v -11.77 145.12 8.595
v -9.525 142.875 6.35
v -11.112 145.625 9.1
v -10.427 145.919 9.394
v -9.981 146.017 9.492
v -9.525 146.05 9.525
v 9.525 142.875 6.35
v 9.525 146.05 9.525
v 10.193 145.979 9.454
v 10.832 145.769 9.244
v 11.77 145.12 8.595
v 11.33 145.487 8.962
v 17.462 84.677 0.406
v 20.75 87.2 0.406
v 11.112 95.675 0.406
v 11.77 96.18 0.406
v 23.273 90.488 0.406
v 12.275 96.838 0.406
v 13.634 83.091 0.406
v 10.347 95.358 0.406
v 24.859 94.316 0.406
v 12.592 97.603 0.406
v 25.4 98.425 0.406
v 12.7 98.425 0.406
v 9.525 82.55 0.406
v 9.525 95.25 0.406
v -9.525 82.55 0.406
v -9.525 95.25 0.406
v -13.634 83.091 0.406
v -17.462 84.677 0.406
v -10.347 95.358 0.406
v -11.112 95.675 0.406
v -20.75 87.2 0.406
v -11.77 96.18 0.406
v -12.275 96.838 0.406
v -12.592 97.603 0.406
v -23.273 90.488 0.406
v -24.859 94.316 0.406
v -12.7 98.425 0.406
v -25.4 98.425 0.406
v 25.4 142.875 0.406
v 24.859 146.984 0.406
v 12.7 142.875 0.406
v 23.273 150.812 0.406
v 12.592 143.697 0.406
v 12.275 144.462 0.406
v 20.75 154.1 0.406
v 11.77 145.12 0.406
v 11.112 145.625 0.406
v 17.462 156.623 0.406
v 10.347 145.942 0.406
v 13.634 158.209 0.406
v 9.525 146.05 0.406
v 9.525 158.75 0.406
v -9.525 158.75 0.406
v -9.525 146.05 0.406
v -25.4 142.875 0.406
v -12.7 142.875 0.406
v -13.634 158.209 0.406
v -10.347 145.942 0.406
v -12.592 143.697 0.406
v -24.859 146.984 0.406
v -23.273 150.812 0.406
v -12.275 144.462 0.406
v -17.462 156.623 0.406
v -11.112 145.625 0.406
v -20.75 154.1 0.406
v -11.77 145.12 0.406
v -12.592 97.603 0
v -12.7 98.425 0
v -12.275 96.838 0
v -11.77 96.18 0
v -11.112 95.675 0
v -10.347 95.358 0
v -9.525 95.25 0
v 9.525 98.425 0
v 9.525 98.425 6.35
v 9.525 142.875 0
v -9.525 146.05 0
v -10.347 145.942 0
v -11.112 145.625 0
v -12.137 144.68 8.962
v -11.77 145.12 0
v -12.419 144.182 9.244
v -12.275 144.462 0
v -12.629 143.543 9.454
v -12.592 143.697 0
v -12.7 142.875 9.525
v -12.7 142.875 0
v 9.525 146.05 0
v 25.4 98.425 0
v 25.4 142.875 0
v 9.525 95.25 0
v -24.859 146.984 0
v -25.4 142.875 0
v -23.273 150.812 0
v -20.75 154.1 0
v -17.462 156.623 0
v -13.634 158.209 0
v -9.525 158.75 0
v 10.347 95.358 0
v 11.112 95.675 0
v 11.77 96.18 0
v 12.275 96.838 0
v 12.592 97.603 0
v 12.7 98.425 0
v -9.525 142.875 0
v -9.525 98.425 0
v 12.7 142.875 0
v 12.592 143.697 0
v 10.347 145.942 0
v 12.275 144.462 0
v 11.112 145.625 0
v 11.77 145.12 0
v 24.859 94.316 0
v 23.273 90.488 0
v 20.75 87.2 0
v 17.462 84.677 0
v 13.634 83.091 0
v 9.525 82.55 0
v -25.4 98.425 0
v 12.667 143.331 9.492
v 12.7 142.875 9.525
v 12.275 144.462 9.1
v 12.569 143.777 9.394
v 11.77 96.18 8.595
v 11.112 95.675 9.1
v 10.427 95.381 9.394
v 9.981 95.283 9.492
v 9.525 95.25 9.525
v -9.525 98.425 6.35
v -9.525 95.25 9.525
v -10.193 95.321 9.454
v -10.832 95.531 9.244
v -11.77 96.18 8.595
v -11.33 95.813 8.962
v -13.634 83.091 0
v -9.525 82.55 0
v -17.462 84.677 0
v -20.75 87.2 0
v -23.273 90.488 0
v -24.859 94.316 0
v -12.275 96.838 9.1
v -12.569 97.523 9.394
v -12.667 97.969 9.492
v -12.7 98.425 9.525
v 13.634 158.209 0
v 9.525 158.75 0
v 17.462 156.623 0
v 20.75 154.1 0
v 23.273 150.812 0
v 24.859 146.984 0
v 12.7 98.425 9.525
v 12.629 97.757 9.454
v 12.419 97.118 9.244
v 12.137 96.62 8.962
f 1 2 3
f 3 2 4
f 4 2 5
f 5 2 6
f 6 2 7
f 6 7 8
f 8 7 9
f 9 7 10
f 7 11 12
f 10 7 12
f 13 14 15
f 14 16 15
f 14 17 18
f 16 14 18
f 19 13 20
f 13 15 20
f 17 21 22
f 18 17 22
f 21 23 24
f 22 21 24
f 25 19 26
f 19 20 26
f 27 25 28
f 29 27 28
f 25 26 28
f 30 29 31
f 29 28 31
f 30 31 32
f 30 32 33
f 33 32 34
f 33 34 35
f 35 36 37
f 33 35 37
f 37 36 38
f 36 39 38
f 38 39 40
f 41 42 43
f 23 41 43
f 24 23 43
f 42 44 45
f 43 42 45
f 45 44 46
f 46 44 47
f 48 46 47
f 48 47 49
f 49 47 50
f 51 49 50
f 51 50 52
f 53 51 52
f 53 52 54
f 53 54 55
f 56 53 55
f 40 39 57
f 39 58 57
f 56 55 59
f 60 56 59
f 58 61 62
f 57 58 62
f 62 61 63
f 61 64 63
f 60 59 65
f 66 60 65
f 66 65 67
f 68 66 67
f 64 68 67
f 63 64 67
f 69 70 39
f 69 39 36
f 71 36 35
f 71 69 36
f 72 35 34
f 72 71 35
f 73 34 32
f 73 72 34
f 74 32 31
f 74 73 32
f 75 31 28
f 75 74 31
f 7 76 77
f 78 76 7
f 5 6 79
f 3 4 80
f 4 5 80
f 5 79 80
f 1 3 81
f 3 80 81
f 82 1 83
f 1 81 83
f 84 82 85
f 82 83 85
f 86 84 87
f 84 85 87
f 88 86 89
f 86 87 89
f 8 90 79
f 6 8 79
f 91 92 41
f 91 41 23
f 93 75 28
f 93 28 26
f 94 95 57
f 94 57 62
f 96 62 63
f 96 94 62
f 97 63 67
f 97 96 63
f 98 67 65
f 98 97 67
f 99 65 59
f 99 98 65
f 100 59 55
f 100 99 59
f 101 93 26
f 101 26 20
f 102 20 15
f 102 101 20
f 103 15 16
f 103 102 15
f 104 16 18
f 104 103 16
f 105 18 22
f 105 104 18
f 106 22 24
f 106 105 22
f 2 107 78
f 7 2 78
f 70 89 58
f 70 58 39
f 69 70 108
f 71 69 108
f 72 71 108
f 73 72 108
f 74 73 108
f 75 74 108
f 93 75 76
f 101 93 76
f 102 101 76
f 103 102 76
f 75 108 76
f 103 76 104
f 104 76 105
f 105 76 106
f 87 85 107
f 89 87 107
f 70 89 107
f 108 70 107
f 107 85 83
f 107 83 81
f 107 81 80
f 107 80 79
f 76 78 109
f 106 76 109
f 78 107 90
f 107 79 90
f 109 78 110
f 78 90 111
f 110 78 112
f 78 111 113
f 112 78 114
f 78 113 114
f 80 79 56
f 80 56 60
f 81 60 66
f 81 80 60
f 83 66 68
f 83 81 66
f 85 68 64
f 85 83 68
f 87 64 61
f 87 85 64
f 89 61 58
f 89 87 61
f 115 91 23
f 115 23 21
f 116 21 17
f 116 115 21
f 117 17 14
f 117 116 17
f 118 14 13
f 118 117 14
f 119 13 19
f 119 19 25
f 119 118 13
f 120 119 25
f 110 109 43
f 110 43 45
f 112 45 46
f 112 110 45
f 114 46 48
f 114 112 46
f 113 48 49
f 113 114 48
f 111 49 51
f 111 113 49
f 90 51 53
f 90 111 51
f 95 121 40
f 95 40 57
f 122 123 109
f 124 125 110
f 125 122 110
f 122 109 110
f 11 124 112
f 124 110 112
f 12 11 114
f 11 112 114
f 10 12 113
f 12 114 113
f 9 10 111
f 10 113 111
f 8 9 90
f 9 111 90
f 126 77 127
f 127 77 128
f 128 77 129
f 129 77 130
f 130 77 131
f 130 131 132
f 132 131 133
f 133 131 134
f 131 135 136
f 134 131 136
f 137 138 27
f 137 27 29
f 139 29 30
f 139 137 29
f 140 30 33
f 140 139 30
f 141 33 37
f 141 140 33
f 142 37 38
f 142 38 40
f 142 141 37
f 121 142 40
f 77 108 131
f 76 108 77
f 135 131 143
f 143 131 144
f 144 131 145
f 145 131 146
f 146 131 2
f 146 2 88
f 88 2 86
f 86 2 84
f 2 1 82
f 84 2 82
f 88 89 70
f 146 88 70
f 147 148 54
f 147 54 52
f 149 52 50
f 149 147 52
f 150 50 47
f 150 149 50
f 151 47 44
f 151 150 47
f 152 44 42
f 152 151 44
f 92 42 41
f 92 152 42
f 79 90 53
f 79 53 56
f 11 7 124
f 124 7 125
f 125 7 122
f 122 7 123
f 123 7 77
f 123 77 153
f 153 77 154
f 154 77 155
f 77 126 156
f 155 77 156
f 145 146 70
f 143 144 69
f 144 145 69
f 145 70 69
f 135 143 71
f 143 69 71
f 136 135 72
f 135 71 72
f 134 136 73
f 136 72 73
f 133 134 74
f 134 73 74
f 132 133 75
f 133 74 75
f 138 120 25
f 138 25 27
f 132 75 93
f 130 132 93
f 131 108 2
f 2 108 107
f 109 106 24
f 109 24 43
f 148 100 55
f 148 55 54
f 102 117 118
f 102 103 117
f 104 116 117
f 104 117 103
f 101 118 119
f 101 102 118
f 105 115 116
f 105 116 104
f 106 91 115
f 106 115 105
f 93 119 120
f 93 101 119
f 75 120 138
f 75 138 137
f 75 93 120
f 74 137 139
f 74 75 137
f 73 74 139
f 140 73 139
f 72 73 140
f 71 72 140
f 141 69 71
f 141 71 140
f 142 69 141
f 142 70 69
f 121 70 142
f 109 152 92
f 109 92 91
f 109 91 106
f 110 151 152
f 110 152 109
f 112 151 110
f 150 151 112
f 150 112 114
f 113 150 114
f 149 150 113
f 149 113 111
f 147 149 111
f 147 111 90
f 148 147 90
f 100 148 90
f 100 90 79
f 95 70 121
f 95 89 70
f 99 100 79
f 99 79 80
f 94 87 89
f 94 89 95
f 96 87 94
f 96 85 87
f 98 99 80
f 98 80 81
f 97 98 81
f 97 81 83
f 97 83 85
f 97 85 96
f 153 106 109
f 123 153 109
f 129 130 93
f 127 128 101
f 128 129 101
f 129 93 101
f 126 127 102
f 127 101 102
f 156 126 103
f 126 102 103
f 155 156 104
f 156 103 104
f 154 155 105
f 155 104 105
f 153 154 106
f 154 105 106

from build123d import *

# Parameters (mm, degrees)
BOSS_EXTRUDE1_DEPTH = 0.4064
SKETCH3_W           = 19.05
SKETCH3_H           = 44.45
BOSS_EXTRUDE5_DEPTH = 9.525


with BuildPart() as part:
    # Sketch2 → Boss-Extrude1 (new body)
    with BuildSketch(Plane.XY):
        with BuildLine():
            Line((-9.525, 158.75), (9.525, 158.75))
            ThreePointArc((9.525, 158.75), (20.750320151, 154.100320151), (25.4, 142.875))
            Line((25.4, 142.875), (25.4, 98.425))
            ThreePointArc((25.4, 98.425), (20.750320151, 87.199679849), (9.525, 82.55))
            Line((9.525, 82.55), (-9.525, 82.55))
            ThreePointArc((-9.525, 82.55), (-20.750320151, 87.199679849), (-25.4, 98.425))
            Line((-25.4, 98.425), (-25.4, 142.875))
            ThreePointArc((-25.4, 142.875), (-20.750320151, 154.100320151), (-9.525, 158.75))
        make_face()
        with BuildLine():
            Line((-9.525, 95.25), (9.525, 95.25))
            ThreePointArc((9.525, 95.25), (11.77006403, 96.17993597), (12.7, 98.425))
            Line((12.7, 98.425), (12.7, 142.875))
            ThreePointArc((12.7, 142.875), (11.77006403, 145.12006403), (9.525, 146.05))
            Line((9.525, 146.05), (-9.525, 146.05))
            ThreePointArc((-9.525, 146.05), (-11.77006403, 145.12006403), (-12.7, 142.875))
            Line((-12.7, 142.875), (-12.7, 98.425))
            ThreePointArc((-12.7, 98.425), (-11.77006403, 96.17993597), (-9.525, 95.25))
        make_face(mode=Mode.SUBTRACT)
    extrude(amount=BOSS_EXTRUDE1_DEPTH)


with BuildPart() as body_2:
    # Sketch3 → Boss-Extrude5 (new body)
    with BuildSketch(Plane.XY):
        with BuildLine():
            Line((-9.525, 95.25), (9.525, 95.25))
            ThreePointArc((9.525, 95.25), (11.77006403, 96.17993597), (12.7, 98.425))
            Line((12.7, 98.425), (12.7, 142.875))
            ThreePointArc((12.7, 142.875), (11.77006403, 145.12006403), (9.525, 146.05))
            Line((9.525, 146.05), (-9.525, 146.05))
            ThreePointArc((-9.525, 146.05), (-11.77006403, 145.12006403), (-12.7, 142.875))
            Line((-12.7, 142.875), (-12.7, 98.425))
            ThreePointArc((-12.7, 98.425), (-11.77006403, 96.17993597), (-9.525, 95.25))
        make_face()
        with Locations((0, 120.65)):
            Rectangle(SKETCH3_W, SKETCH3_H, mode=Mode.SUBTRACT)
    extrude(amount=BOSS_EXTRUDE5_DEPTH)

    # Chamfer2
    # the kernel refuses this chamfer: 3.175 mm, written as the material it takes off along each edge
    with BuildSketch(Plane(origin=(9.525, 142.875, 9.525), x_dir=(0, -0.02749587661058566, -0.9996219169112968), z_dir=(-1, 0, 0)), Plane(origin=(-9.525, 98.425, 9.525), x_dir=(0, 0.027495876610585654, -0.9996219169112968), z_dir=(1, 0, 0))) as chamfer2_piece_1:
        with BuildLine():
            Line((3.266037395, 0), (-0.179537217, -3.261098994))
            Line((-0.179537217, -3.261098994), (-0.243013208, -3.259353006))
            ThreePointArc((-0.243013208, -3.259353006), (-0.108360296, -1.630038109), (-0.063475992, 0.001745988))
            Line((-0.063475992, 0.001745988), (0.001745988, 0.063475992))
            ThreePointArc((0.001745988, 0.063475992), (1.633530085, 0.018591688), (3.267783383, 0.063475992))
            Line((3.267783383, 0.063475992), (3.266037395, 0))
        make_face()
    extrude(amount=19.05, mode=Mode.SUBTRACT)
    with BuildSketch(Plane(origin=(9.525, 98.425, 9.525), x_dir=(-0.027495876610586195, 0, -0.9996219169112966), z_dir=(0, 1, 0)), Plane(origin=(-9.525, 142.875, 9.525), x_dir=(0.027495876610586195, 0, -0.9996219169112966), z_dir=(0, -1, 0))) as chamfer2_piece_2:
        with BuildLine():
            Line((3.266037395, 0), (-0.179537217, -3.261098994))
            Line((-0.179537217, -3.261098994), (-0.243013208, -3.259353006))
            ThreePointArc((-0.243013208, -3.259353006), (-0.108360296, -1.630038109), (-0.063475992, 0.001745988))
            Line((-0.063475992, 0.001745988), (0.001745988, 0.063475992))
            ThreePointArc((0.001745988, 0.063475992), (1.633530085, 0.018591688), (3.267783383, 0.063475992))
            Line((3.267783383, 0.063475992), (3.266037395, 0))
        make_face()
    extrude(amount=44.45, mode=Mode.SUBTRACT)
    with BuildSketch(Plane(origin=(17.690093487, 142.875, 9.525), x_dir=(0, -0.02749587661058566, -0.9996219169112968), z_dir=(-1, 0, 0))) as chamfer2_piece_3a_section:
        with BuildLine():
            Line((3.266037395, 0), (-0.179537217, -3.261098994))
            Line((-0.179537217, -3.261098994), (-0.243013208, -3.259353006))
            ThreePointArc((-0.243013208, -3.259353006), (-0.108360296, -1.630038109), (-0.063475992, 0.001745988))
            Line((-0.063475992, 0.001745988), (0.001745988, 0.063475992))
            ThreePointArc((0.001745988, 0.063475992), (1.633530085, 0.018591688), (3.267783383, 0.063475992))
            Line((3.267783383, 0.063475992), (3.266037395, 0))
        make_face()
    chamfer2_piece_3a = extrude(amount=27.215093487, mode=Mode.PRIVATE)
    chamfer2_piece_3a = split(chamfer2_piece_3a, bisect_by=Plane(origin=(9.525, 143.922094765, 8.477905235), z_dir=(1, 0, 0)), keep=Keep.TOP, mode=Mode.PRIVATE)
    with BuildSketch(Plane(origin=(9.525, 98.425, 9.525), x_dir=(-0.027495876610586195, 0, -0.9996219169112966), z_dir=(0, 1, 0))) as chamfer2_piece_3b_section:
        with BuildLine():
            Line((3.266037395, 0), (-0.179537217, -3.261098994))
            Line((-0.179537217, -3.261098994), (-0.243013208, -3.259353006))
            ThreePointArc((-0.243013208, -3.259353006), (-0.108360296, -1.630038109), (-0.063475992, 0.001745988))
            Line((-0.063475992, 0.001745988), (0.001745988, 0.063475992))
            ThreePointArc((0.001745988, 0.063475992), (1.633530085, 0.018591688), (3.267783383, 0.063475992))
            Line((3.267783383, 0.063475992), (3.266037395, 0))
        make_face()
    chamfer2_piece_3b = extrude(amount=52.615093487, mode=Mode.PRIVATE)
    chamfer2_piece_3b = split(chamfer2_piece_3b, bisect_by=Plane(origin=(10.572094765, 142.875, 8.477905235), z_dir=(0, 1, 0)), keep=Keep.TOP, mode=Mode.PRIVATE)
    chamfer2_piece_3 = chamfer2_piece_3a & chamfer2_piece_3b
    add(chamfer2_piece_3, mode=Mode.SUBTRACT)
    with BuildSketch(Plane(origin=(9.525, 142.875, 9.525), x_dir=(0, -0.02749587661058566, -0.9996219169112968), z_dir=(-1, 0, 0))) as chamfer2_piece_4a_section:
        with BuildLine():
            Line((3.266037395, 0), (-0.179537217, -3.261098994))
            Line((-0.179537217, -3.261098994), (-0.243013208, -3.259353006))
            ThreePointArc((-0.243013208, -3.259353006), (-0.108360296, -1.630038109), (-0.063475992, 0.001745988))
            Line((-0.063475992, 0.001745988), (0.001745988, 0.063475992))
            ThreePointArc((0.001745988, 0.063475992), (1.633530085, 0.018591688), (3.267783383, 0.063475992))
            Line((3.267783383, 0.063475992), (3.266037395, 0))
        make_face()
    chamfer2_piece_4a = extrude(amount=27.215093487, mode=Mode.PRIVATE)
    chamfer2_piece_4a = split(chamfer2_piece_4a, bisect_by=Plane(origin=(-9.525, 143.922094765, 8.477905235), z_dir=(-1, 0, 0)), keep=Keep.TOP, mode=Mode.PRIVATE)
    with BuildSketch(Plane(origin=(-9.525, 151.040093487, 9.525), x_dir=(0.027495876610586195, 0, -0.9996219169112966), z_dir=(0, -1, 0))) as chamfer2_piece_4b_section:
        with BuildLine():
            Line((3.266037395, 0), (-0.179537217, -3.261098994))
            Line((-0.179537217, -3.261098994), (-0.243013208, -3.259353006))
            ThreePointArc((-0.243013208, -3.259353006), (-0.108360296, -1.630038109), (-0.063475992, 0.001745988))
            Line((-0.063475992, 0.001745988), (0.001745988, 0.063475992))
            ThreePointArc((0.001745988, 0.063475992), (1.633530085, 0.018591688), (3.267783383, 0.063475992))
            Line((3.267783383, 0.063475992), (3.266037395, 0))
        make_face()
    chamfer2_piece_4b = extrude(amount=52.615093487, mode=Mode.PRIVATE)
    chamfer2_piece_4b = split(chamfer2_piece_4b, bisect_by=Plane(origin=(-10.572094765, 142.875, 8.477905235), z_dir=(0, 1, 0)), keep=Keep.TOP, mode=Mode.PRIVATE)
    chamfer2_piece_4 = chamfer2_piece_4a & chamfer2_piece_4b
    add(chamfer2_piece_4, mode=Mode.SUBTRACT)
    with BuildSketch(Plane(origin=(9.525, 90.259906513, 9.525), x_dir=(-0.027495876610586195, 0, -0.9996219169112966), z_dir=(0, 1, 0))) as chamfer2_piece_5a_section:
        with BuildLine():
            Line((3.266037395, 0), (-0.179537217, -3.261098994))
            Line((-0.179537217, -3.261098994), (-0.243013208, -3.259353006))
            ThreePointArc((-0.243013208, -3.259353006), (-0.108360296, -1.630038109), (-0.063475992, 0.001745988))
            Line((-0.063475992, 0.001745988), (0.001745988, 0.063475992))
            ThreePointArc((0.001745988, 0.063475992), (1.633530085, 0.018591688), (3.267783383, 0.063475992))
            Line((3.267783383, 0.063475992), (3.266037395, 0))
        make_face()
    chamfer2_piece_5a = extrude(amount=52.615093487, mode=Mode.PRIVATE)
    chamfer2_piece_5a = split(chamfer2_piece_5a, bisect_by=Plane(origin=(10.572094765, 98.425, 8.477905235), z_dir=(0, -1, 0)), keep=Keep.TOP, mode=Mode.PRIVATE)
    with BuildSketch(Plane(origin=(-9.525, 98.425, 9.525), x_dir=(0, 0.027495876610585654, -0.9996219169112968), z_dir=(1, 0, 0))) as chamfer2_piece_5b_section:
        with BuildLine():
            Line((3.266037395, 0), (-0.179537217, -3.261098994))
            Line((-0.179537217, -3.261098994), (-0.243013208, -3.259353006))
            ThreePointArc((-0.243013208, -3.259353006), (-0.108360296, -1.630038109), (-0.063475992, 0.001745988))
            Line((-0.063475992, 0.001745988), (0.001745988, 0.063475992))
            ThreePointArc((0.001745988, 0.063475992), (1.633530085, 0.018591688), (3.267783383, 0.063475992))
            Line((3.267783383, 0.063475992), (3.266037395, 0))
        make_face()
    chamfer2_piece_5b = extrude(amount=27.215093487, mode=Mode.PRIVATE)
    chamfer2_piece_5b = split(chamfer2_piece_5b, bisect_by=Plane(origin=(9.525, 97.377905235, 8.477905235), z_dir=(1, 0, 0)), keep=Keep.TOP, mode=Mode.PRIVATE)
    chamfer2_piece_5 = chamfer2_piece_5a & chamfer2_piece_5b
    add(chamfer2_piece_5, mode=Mode.SUBTRACT)
    with BuildSketch(Plane(origin=(-17.690093487, 98.425, 9.525), x_dir=(0, 0.027495876610585654, -0.9996219169112968), z_dir=(1, 0, 0))) as chamfer2_piece_6a_section:
        with BuildLine():
            Line((3.266037395, 0), (-0.179537217, -3.261098994))
            Line((-0.179537217, -3.261098994), (-0.243013208, -3.259353006))
            ThreePointArc((-0.243013208, -3.259353006), (-0.108360296, -1.630038109), (-0.063475992, 0.001745988))
            Line((-0.063475992, 0.001745988), (0.001745988, 0.063475992))
            ThreePointArc((0.001745988, 0.063475992), (1.633530085, 0.018591688), (3.267783383, 0.063475992))
            Line((3.267783383, 0.063475992), (3.266037395, 0))
        make_face()
    chamfer2_piece_6a = extrude(amount=27.215093487, mode=Mode.PRIVATE)
    chamfer2_piece_6a = split(chamfer2_piece_6a, bisect_by=Plane(origin=(-9.525, 97.377905235, 8.477905235), z_dir=(-1, 0, 0)), keep=Keep.TOP, mode=Mode.PRIVATE)
    with BuildSketch(Plane(origin=(-9.525, 142.875, 9.525), x_dir=(0.027495876610586195, 0, -0.9996219169112966), z_dir=(0, -1, 0))) as chamfer2_piece_6b_section:
        with BuildLine():
            Line((3.266037395, 0), (-0.179537217, -3.261098994))
            Line((-0.179537217, -3.261098994), (-0.243013208, -3.259353006))
            ThreePointArc((-0.243013208, -3.259353006), (-0.108360296, -1.630038109), (-0.063475992, 0.001745988))
            Line((-0.063475992, 0.001745988), (0.001745988, 0.063475992))
            ThreePointArc((0.001745988, 0.063475992), (1.633530085, 0.018591688), (3.267783383, 0.063475992))
            Line((3.267783383, 0.063475992), (3.266037395, 0))
        make_face()
    chamfer2_piece_6b = extrude(amount=52.615093487, mode=Mode.PRIVATE)
    chamfer2_piece_6b = split(chamfer2_piece_6b, bisect_by=Plane(origin=(-10.572094765, 98.425, 8.477905235), z_dir=(0, -1, 0)), keep=Keep.TOP, mode=Mode.PRIVATE)
    chamfer2_piece_6 = chamfer2_piece_6a & chamfer2_piece_6b
    add(chamfer2_piece_6, mode=Mode.SUBTRACT)


solid = Compound([part.part, body_2.part])
